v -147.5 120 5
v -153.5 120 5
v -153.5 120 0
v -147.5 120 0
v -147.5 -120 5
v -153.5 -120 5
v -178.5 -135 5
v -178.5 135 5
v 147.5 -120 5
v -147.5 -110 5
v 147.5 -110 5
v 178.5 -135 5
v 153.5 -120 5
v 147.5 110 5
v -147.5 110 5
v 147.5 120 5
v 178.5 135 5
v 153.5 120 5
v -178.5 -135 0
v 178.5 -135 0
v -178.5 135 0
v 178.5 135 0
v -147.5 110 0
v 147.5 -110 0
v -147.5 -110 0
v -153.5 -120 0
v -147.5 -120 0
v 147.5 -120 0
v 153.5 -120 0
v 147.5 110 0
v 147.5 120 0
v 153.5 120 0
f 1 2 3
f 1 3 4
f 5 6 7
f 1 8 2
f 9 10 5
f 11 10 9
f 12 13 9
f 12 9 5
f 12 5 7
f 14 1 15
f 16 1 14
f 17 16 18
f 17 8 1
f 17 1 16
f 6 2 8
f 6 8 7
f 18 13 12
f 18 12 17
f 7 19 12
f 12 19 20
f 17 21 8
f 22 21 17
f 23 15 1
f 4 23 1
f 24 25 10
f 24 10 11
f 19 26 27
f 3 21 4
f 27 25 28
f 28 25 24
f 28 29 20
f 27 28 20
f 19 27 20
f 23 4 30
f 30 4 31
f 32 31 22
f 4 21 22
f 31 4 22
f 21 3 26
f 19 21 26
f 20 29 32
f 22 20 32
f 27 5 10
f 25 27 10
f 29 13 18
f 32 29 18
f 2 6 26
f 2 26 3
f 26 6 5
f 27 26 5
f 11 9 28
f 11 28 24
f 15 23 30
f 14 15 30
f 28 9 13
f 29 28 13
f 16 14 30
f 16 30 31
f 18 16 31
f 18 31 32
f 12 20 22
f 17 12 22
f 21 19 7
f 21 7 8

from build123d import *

# Parameters (mm, degrees)
SKETCH1_W          = 357
SKETCH1_H          = 270
SKETCH1_W_2        = 307
SKETCH1_H_2        = 220
EXTRUDE1_DEPTH     = 5
SKETCH3_W          = 6
SKETCH3_H          = 10
CUT_EXTRUDE1_DEPTH = 224.857655665


with BuildPart() as part:
    # Sketch1 → Extrude1 (new body)
    with BuildSketch(Plane.XY):
        Rectangle(SKETCH1_W, SKETCH1_H)
        Rectangle(SKETCH1_W_2, SKETCH1_H_2, mode=Mode.SUBTRACT)
    extrude(amount=EXTRUDE1_DEPTH)

    # Sketch3 → Cut-Extrude1 (cut, through all)
    with BuildSketch(Plane.XY.offset(5)):
        with Locations((-150.5, 115)):
            Rectangle(SKETCH3_W, SKETCH3_H)
        with Locations((150.5, 115)):
            Rectangle(SKETCH3_W, SKETCH3_H)
        with Locations((150.5, -115)):
            Rectangle(SKETCH3_W, SKETCH3_H)
        with Locations((-150.5, -115)):
            Rectangle(SKETCH3_W, SKETCH3_H)
    extrude(amount=-CUT_EXTRUDE1_DEPTH, mode=Mode.SUBTRACT)


solid = part.part
